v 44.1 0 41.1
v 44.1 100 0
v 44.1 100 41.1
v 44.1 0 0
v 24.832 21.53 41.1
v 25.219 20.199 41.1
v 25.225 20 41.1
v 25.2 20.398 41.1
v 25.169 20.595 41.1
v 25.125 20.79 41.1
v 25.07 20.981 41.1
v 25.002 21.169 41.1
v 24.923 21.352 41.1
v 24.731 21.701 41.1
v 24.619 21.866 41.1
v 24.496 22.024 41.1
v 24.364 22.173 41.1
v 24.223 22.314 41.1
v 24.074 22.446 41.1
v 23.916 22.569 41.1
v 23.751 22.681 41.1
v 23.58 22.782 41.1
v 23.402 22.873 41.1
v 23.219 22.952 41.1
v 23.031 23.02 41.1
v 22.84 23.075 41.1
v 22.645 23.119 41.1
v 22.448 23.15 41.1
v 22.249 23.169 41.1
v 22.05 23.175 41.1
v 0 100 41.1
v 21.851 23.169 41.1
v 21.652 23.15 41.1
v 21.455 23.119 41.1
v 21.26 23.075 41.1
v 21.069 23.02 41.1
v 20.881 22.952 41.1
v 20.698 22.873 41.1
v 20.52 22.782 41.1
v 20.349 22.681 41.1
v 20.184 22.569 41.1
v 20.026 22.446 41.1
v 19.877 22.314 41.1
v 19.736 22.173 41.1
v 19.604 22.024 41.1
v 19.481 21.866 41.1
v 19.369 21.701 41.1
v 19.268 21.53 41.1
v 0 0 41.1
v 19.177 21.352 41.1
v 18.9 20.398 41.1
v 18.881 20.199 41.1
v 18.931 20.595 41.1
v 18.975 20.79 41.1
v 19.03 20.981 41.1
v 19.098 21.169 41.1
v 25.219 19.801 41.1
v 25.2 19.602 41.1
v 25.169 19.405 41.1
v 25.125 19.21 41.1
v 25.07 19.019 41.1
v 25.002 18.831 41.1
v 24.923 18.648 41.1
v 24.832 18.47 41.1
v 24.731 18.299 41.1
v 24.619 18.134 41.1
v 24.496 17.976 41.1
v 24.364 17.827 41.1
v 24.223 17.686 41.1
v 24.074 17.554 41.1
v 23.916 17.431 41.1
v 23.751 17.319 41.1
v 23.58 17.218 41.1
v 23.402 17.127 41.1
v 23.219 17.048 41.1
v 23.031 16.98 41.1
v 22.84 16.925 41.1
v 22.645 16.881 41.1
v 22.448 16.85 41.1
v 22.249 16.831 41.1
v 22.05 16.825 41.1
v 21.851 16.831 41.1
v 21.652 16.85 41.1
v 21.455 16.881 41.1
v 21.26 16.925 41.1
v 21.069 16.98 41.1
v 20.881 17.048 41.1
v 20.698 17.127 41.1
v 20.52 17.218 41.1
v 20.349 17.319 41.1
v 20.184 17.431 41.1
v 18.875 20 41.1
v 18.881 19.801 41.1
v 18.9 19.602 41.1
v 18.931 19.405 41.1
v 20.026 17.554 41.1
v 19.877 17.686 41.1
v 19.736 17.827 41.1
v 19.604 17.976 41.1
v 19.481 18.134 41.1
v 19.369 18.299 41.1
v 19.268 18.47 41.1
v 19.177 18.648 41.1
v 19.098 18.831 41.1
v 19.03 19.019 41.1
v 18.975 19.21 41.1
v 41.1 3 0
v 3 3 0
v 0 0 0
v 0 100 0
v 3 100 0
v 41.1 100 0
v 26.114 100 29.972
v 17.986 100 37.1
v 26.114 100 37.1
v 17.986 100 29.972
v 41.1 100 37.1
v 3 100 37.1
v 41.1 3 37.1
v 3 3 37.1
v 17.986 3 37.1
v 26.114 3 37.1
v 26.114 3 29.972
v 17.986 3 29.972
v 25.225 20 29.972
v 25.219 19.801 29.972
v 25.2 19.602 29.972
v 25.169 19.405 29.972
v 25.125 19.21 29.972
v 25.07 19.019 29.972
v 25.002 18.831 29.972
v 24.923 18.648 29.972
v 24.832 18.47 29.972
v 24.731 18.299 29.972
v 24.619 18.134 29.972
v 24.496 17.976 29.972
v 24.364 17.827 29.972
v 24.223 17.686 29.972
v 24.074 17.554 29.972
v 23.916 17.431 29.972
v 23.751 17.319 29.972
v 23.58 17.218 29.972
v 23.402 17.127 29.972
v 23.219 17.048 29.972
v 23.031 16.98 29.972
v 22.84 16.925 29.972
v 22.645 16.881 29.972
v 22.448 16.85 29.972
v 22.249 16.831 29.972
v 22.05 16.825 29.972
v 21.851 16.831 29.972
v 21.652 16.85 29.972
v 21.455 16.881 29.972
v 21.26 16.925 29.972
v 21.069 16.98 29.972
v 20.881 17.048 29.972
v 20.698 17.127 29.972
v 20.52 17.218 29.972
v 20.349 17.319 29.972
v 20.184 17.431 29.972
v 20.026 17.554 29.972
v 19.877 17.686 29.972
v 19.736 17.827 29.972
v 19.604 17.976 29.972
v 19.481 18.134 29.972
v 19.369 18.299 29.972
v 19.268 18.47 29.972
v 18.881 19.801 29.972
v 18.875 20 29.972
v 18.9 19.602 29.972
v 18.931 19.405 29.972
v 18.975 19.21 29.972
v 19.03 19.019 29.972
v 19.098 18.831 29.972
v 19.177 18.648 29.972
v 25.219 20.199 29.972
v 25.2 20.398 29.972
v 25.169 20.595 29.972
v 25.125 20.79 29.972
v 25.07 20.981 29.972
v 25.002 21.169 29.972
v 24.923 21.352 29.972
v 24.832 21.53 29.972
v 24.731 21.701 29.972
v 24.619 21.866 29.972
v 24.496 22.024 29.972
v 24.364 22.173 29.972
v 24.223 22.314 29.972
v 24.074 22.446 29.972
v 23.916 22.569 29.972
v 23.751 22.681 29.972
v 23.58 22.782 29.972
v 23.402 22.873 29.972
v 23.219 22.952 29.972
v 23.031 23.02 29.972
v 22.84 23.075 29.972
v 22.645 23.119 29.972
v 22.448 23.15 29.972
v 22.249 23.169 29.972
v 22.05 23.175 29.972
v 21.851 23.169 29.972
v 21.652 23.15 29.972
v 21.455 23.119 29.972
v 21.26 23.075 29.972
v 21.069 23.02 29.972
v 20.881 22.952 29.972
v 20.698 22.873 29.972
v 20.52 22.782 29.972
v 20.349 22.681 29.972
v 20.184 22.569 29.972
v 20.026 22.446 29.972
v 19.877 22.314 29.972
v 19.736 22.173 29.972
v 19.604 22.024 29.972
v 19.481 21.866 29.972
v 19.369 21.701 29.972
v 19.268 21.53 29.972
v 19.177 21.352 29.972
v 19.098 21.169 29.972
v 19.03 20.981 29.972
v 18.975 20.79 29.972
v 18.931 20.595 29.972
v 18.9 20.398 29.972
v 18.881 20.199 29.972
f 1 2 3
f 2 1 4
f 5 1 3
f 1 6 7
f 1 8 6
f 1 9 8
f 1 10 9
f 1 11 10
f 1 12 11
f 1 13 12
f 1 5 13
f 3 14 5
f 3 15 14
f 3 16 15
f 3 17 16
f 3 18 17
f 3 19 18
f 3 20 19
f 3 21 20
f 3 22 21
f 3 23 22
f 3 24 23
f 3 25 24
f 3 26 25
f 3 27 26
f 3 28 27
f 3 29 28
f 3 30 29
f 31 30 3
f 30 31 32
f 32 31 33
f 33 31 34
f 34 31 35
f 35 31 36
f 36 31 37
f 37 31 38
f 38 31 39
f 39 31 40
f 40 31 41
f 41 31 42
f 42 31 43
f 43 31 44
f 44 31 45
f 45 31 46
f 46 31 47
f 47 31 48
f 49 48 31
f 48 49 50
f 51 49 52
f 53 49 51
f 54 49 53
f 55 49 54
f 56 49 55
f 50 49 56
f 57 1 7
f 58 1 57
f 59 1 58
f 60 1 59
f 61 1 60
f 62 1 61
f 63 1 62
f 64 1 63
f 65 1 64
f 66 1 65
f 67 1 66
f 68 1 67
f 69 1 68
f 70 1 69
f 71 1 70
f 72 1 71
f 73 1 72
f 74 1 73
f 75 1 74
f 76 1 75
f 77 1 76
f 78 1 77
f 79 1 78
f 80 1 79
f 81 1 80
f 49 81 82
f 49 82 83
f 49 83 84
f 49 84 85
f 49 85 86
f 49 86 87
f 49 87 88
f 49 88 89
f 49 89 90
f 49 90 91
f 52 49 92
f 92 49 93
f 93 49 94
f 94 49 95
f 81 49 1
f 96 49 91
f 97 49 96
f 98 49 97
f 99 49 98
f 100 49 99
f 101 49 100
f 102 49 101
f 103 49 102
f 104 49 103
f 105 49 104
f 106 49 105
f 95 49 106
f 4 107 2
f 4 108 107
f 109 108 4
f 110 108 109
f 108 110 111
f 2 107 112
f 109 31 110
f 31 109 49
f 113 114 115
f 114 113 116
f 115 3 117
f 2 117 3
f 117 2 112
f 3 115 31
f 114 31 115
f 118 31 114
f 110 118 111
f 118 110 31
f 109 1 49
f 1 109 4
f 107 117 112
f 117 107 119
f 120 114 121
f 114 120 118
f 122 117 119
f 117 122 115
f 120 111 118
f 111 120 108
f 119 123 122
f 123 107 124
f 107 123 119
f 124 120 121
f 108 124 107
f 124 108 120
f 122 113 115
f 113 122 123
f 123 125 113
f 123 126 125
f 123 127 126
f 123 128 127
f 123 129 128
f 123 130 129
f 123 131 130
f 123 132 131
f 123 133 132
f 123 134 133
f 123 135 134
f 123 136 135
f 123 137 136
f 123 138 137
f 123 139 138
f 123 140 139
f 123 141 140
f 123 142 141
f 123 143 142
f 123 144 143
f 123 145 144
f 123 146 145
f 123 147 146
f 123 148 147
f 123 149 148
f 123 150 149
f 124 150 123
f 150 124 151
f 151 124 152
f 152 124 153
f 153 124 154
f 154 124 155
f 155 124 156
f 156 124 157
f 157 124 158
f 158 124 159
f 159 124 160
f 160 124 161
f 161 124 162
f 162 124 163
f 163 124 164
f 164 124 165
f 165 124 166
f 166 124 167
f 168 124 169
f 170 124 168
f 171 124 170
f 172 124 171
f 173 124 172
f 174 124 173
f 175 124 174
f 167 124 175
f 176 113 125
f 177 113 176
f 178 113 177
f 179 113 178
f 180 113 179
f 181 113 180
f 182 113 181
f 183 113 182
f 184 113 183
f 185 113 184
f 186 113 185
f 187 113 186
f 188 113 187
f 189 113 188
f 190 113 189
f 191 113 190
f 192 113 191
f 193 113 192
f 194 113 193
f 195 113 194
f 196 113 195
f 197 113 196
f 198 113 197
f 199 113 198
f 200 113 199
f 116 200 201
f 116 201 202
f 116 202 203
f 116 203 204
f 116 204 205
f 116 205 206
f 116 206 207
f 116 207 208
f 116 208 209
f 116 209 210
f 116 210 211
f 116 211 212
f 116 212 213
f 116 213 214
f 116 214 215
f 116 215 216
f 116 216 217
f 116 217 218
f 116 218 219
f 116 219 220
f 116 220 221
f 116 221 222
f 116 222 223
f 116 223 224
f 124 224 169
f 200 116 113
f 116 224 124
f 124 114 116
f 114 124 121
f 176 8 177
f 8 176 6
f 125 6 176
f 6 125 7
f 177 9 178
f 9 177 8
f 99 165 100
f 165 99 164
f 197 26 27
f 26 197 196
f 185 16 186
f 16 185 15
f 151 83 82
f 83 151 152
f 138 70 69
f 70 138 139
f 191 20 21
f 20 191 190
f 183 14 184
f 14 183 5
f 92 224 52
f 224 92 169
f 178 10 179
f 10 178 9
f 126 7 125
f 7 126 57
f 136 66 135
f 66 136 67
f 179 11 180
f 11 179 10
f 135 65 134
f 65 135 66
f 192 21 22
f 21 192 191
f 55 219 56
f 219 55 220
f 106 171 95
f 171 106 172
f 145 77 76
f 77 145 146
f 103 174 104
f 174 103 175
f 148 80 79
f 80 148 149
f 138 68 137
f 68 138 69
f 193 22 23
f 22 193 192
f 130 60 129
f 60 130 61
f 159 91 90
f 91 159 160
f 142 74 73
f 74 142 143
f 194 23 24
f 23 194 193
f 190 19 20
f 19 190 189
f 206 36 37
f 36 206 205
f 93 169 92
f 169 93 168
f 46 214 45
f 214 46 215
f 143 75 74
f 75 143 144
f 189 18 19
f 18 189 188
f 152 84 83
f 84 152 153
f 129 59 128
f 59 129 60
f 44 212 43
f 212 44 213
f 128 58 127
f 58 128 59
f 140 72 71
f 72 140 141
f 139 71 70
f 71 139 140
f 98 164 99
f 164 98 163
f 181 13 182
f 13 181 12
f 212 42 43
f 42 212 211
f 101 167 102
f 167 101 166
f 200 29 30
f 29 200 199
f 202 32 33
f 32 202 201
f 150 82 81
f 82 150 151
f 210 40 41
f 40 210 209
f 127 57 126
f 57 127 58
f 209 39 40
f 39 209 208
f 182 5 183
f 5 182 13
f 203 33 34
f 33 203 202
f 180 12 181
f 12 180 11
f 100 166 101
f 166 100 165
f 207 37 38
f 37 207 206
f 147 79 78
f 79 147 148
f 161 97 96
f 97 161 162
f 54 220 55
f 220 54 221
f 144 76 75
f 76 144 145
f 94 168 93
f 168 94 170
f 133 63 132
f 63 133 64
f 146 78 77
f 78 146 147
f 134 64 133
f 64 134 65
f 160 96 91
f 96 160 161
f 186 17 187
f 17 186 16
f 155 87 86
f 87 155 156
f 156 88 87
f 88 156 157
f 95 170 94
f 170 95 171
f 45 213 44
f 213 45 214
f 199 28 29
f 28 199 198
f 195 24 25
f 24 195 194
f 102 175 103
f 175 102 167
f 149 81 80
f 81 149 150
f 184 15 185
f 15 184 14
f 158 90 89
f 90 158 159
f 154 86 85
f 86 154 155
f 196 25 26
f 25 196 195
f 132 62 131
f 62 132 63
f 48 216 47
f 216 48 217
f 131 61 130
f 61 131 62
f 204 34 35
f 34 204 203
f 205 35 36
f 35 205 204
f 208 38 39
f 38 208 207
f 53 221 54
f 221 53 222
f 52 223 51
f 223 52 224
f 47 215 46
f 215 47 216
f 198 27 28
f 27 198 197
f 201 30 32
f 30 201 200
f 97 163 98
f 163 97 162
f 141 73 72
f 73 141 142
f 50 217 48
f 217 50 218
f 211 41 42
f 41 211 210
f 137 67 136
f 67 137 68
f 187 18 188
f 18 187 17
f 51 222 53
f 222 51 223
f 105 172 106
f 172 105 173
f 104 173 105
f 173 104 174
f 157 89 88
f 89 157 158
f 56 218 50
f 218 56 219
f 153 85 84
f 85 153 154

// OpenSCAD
$fn = 100;
padding = 3;
xz = 38.1;
y = 100;
channel_xz = 8.128;
drill_dia = 6.35;
difference() {
  union() {
    //main hollow box
    difference() {
      cube([xz+padding*2, y, xz+padding]);
      translate([3, 3, -1]) {
        cube([xz, y, xz]);
      }
    }
    //channel
    translate([(xz+padding*2)/2 - channel_xz/2, 0, xz-channel_xz]) {
      cube([channel_xz, y, channel_xz]);
    }
  }
  // drill hole
  translate([(xz+padding*2)/2, 20, -1]) {
    cylinder(d=drill_dia, h=xz+padding*2);
  }
}
